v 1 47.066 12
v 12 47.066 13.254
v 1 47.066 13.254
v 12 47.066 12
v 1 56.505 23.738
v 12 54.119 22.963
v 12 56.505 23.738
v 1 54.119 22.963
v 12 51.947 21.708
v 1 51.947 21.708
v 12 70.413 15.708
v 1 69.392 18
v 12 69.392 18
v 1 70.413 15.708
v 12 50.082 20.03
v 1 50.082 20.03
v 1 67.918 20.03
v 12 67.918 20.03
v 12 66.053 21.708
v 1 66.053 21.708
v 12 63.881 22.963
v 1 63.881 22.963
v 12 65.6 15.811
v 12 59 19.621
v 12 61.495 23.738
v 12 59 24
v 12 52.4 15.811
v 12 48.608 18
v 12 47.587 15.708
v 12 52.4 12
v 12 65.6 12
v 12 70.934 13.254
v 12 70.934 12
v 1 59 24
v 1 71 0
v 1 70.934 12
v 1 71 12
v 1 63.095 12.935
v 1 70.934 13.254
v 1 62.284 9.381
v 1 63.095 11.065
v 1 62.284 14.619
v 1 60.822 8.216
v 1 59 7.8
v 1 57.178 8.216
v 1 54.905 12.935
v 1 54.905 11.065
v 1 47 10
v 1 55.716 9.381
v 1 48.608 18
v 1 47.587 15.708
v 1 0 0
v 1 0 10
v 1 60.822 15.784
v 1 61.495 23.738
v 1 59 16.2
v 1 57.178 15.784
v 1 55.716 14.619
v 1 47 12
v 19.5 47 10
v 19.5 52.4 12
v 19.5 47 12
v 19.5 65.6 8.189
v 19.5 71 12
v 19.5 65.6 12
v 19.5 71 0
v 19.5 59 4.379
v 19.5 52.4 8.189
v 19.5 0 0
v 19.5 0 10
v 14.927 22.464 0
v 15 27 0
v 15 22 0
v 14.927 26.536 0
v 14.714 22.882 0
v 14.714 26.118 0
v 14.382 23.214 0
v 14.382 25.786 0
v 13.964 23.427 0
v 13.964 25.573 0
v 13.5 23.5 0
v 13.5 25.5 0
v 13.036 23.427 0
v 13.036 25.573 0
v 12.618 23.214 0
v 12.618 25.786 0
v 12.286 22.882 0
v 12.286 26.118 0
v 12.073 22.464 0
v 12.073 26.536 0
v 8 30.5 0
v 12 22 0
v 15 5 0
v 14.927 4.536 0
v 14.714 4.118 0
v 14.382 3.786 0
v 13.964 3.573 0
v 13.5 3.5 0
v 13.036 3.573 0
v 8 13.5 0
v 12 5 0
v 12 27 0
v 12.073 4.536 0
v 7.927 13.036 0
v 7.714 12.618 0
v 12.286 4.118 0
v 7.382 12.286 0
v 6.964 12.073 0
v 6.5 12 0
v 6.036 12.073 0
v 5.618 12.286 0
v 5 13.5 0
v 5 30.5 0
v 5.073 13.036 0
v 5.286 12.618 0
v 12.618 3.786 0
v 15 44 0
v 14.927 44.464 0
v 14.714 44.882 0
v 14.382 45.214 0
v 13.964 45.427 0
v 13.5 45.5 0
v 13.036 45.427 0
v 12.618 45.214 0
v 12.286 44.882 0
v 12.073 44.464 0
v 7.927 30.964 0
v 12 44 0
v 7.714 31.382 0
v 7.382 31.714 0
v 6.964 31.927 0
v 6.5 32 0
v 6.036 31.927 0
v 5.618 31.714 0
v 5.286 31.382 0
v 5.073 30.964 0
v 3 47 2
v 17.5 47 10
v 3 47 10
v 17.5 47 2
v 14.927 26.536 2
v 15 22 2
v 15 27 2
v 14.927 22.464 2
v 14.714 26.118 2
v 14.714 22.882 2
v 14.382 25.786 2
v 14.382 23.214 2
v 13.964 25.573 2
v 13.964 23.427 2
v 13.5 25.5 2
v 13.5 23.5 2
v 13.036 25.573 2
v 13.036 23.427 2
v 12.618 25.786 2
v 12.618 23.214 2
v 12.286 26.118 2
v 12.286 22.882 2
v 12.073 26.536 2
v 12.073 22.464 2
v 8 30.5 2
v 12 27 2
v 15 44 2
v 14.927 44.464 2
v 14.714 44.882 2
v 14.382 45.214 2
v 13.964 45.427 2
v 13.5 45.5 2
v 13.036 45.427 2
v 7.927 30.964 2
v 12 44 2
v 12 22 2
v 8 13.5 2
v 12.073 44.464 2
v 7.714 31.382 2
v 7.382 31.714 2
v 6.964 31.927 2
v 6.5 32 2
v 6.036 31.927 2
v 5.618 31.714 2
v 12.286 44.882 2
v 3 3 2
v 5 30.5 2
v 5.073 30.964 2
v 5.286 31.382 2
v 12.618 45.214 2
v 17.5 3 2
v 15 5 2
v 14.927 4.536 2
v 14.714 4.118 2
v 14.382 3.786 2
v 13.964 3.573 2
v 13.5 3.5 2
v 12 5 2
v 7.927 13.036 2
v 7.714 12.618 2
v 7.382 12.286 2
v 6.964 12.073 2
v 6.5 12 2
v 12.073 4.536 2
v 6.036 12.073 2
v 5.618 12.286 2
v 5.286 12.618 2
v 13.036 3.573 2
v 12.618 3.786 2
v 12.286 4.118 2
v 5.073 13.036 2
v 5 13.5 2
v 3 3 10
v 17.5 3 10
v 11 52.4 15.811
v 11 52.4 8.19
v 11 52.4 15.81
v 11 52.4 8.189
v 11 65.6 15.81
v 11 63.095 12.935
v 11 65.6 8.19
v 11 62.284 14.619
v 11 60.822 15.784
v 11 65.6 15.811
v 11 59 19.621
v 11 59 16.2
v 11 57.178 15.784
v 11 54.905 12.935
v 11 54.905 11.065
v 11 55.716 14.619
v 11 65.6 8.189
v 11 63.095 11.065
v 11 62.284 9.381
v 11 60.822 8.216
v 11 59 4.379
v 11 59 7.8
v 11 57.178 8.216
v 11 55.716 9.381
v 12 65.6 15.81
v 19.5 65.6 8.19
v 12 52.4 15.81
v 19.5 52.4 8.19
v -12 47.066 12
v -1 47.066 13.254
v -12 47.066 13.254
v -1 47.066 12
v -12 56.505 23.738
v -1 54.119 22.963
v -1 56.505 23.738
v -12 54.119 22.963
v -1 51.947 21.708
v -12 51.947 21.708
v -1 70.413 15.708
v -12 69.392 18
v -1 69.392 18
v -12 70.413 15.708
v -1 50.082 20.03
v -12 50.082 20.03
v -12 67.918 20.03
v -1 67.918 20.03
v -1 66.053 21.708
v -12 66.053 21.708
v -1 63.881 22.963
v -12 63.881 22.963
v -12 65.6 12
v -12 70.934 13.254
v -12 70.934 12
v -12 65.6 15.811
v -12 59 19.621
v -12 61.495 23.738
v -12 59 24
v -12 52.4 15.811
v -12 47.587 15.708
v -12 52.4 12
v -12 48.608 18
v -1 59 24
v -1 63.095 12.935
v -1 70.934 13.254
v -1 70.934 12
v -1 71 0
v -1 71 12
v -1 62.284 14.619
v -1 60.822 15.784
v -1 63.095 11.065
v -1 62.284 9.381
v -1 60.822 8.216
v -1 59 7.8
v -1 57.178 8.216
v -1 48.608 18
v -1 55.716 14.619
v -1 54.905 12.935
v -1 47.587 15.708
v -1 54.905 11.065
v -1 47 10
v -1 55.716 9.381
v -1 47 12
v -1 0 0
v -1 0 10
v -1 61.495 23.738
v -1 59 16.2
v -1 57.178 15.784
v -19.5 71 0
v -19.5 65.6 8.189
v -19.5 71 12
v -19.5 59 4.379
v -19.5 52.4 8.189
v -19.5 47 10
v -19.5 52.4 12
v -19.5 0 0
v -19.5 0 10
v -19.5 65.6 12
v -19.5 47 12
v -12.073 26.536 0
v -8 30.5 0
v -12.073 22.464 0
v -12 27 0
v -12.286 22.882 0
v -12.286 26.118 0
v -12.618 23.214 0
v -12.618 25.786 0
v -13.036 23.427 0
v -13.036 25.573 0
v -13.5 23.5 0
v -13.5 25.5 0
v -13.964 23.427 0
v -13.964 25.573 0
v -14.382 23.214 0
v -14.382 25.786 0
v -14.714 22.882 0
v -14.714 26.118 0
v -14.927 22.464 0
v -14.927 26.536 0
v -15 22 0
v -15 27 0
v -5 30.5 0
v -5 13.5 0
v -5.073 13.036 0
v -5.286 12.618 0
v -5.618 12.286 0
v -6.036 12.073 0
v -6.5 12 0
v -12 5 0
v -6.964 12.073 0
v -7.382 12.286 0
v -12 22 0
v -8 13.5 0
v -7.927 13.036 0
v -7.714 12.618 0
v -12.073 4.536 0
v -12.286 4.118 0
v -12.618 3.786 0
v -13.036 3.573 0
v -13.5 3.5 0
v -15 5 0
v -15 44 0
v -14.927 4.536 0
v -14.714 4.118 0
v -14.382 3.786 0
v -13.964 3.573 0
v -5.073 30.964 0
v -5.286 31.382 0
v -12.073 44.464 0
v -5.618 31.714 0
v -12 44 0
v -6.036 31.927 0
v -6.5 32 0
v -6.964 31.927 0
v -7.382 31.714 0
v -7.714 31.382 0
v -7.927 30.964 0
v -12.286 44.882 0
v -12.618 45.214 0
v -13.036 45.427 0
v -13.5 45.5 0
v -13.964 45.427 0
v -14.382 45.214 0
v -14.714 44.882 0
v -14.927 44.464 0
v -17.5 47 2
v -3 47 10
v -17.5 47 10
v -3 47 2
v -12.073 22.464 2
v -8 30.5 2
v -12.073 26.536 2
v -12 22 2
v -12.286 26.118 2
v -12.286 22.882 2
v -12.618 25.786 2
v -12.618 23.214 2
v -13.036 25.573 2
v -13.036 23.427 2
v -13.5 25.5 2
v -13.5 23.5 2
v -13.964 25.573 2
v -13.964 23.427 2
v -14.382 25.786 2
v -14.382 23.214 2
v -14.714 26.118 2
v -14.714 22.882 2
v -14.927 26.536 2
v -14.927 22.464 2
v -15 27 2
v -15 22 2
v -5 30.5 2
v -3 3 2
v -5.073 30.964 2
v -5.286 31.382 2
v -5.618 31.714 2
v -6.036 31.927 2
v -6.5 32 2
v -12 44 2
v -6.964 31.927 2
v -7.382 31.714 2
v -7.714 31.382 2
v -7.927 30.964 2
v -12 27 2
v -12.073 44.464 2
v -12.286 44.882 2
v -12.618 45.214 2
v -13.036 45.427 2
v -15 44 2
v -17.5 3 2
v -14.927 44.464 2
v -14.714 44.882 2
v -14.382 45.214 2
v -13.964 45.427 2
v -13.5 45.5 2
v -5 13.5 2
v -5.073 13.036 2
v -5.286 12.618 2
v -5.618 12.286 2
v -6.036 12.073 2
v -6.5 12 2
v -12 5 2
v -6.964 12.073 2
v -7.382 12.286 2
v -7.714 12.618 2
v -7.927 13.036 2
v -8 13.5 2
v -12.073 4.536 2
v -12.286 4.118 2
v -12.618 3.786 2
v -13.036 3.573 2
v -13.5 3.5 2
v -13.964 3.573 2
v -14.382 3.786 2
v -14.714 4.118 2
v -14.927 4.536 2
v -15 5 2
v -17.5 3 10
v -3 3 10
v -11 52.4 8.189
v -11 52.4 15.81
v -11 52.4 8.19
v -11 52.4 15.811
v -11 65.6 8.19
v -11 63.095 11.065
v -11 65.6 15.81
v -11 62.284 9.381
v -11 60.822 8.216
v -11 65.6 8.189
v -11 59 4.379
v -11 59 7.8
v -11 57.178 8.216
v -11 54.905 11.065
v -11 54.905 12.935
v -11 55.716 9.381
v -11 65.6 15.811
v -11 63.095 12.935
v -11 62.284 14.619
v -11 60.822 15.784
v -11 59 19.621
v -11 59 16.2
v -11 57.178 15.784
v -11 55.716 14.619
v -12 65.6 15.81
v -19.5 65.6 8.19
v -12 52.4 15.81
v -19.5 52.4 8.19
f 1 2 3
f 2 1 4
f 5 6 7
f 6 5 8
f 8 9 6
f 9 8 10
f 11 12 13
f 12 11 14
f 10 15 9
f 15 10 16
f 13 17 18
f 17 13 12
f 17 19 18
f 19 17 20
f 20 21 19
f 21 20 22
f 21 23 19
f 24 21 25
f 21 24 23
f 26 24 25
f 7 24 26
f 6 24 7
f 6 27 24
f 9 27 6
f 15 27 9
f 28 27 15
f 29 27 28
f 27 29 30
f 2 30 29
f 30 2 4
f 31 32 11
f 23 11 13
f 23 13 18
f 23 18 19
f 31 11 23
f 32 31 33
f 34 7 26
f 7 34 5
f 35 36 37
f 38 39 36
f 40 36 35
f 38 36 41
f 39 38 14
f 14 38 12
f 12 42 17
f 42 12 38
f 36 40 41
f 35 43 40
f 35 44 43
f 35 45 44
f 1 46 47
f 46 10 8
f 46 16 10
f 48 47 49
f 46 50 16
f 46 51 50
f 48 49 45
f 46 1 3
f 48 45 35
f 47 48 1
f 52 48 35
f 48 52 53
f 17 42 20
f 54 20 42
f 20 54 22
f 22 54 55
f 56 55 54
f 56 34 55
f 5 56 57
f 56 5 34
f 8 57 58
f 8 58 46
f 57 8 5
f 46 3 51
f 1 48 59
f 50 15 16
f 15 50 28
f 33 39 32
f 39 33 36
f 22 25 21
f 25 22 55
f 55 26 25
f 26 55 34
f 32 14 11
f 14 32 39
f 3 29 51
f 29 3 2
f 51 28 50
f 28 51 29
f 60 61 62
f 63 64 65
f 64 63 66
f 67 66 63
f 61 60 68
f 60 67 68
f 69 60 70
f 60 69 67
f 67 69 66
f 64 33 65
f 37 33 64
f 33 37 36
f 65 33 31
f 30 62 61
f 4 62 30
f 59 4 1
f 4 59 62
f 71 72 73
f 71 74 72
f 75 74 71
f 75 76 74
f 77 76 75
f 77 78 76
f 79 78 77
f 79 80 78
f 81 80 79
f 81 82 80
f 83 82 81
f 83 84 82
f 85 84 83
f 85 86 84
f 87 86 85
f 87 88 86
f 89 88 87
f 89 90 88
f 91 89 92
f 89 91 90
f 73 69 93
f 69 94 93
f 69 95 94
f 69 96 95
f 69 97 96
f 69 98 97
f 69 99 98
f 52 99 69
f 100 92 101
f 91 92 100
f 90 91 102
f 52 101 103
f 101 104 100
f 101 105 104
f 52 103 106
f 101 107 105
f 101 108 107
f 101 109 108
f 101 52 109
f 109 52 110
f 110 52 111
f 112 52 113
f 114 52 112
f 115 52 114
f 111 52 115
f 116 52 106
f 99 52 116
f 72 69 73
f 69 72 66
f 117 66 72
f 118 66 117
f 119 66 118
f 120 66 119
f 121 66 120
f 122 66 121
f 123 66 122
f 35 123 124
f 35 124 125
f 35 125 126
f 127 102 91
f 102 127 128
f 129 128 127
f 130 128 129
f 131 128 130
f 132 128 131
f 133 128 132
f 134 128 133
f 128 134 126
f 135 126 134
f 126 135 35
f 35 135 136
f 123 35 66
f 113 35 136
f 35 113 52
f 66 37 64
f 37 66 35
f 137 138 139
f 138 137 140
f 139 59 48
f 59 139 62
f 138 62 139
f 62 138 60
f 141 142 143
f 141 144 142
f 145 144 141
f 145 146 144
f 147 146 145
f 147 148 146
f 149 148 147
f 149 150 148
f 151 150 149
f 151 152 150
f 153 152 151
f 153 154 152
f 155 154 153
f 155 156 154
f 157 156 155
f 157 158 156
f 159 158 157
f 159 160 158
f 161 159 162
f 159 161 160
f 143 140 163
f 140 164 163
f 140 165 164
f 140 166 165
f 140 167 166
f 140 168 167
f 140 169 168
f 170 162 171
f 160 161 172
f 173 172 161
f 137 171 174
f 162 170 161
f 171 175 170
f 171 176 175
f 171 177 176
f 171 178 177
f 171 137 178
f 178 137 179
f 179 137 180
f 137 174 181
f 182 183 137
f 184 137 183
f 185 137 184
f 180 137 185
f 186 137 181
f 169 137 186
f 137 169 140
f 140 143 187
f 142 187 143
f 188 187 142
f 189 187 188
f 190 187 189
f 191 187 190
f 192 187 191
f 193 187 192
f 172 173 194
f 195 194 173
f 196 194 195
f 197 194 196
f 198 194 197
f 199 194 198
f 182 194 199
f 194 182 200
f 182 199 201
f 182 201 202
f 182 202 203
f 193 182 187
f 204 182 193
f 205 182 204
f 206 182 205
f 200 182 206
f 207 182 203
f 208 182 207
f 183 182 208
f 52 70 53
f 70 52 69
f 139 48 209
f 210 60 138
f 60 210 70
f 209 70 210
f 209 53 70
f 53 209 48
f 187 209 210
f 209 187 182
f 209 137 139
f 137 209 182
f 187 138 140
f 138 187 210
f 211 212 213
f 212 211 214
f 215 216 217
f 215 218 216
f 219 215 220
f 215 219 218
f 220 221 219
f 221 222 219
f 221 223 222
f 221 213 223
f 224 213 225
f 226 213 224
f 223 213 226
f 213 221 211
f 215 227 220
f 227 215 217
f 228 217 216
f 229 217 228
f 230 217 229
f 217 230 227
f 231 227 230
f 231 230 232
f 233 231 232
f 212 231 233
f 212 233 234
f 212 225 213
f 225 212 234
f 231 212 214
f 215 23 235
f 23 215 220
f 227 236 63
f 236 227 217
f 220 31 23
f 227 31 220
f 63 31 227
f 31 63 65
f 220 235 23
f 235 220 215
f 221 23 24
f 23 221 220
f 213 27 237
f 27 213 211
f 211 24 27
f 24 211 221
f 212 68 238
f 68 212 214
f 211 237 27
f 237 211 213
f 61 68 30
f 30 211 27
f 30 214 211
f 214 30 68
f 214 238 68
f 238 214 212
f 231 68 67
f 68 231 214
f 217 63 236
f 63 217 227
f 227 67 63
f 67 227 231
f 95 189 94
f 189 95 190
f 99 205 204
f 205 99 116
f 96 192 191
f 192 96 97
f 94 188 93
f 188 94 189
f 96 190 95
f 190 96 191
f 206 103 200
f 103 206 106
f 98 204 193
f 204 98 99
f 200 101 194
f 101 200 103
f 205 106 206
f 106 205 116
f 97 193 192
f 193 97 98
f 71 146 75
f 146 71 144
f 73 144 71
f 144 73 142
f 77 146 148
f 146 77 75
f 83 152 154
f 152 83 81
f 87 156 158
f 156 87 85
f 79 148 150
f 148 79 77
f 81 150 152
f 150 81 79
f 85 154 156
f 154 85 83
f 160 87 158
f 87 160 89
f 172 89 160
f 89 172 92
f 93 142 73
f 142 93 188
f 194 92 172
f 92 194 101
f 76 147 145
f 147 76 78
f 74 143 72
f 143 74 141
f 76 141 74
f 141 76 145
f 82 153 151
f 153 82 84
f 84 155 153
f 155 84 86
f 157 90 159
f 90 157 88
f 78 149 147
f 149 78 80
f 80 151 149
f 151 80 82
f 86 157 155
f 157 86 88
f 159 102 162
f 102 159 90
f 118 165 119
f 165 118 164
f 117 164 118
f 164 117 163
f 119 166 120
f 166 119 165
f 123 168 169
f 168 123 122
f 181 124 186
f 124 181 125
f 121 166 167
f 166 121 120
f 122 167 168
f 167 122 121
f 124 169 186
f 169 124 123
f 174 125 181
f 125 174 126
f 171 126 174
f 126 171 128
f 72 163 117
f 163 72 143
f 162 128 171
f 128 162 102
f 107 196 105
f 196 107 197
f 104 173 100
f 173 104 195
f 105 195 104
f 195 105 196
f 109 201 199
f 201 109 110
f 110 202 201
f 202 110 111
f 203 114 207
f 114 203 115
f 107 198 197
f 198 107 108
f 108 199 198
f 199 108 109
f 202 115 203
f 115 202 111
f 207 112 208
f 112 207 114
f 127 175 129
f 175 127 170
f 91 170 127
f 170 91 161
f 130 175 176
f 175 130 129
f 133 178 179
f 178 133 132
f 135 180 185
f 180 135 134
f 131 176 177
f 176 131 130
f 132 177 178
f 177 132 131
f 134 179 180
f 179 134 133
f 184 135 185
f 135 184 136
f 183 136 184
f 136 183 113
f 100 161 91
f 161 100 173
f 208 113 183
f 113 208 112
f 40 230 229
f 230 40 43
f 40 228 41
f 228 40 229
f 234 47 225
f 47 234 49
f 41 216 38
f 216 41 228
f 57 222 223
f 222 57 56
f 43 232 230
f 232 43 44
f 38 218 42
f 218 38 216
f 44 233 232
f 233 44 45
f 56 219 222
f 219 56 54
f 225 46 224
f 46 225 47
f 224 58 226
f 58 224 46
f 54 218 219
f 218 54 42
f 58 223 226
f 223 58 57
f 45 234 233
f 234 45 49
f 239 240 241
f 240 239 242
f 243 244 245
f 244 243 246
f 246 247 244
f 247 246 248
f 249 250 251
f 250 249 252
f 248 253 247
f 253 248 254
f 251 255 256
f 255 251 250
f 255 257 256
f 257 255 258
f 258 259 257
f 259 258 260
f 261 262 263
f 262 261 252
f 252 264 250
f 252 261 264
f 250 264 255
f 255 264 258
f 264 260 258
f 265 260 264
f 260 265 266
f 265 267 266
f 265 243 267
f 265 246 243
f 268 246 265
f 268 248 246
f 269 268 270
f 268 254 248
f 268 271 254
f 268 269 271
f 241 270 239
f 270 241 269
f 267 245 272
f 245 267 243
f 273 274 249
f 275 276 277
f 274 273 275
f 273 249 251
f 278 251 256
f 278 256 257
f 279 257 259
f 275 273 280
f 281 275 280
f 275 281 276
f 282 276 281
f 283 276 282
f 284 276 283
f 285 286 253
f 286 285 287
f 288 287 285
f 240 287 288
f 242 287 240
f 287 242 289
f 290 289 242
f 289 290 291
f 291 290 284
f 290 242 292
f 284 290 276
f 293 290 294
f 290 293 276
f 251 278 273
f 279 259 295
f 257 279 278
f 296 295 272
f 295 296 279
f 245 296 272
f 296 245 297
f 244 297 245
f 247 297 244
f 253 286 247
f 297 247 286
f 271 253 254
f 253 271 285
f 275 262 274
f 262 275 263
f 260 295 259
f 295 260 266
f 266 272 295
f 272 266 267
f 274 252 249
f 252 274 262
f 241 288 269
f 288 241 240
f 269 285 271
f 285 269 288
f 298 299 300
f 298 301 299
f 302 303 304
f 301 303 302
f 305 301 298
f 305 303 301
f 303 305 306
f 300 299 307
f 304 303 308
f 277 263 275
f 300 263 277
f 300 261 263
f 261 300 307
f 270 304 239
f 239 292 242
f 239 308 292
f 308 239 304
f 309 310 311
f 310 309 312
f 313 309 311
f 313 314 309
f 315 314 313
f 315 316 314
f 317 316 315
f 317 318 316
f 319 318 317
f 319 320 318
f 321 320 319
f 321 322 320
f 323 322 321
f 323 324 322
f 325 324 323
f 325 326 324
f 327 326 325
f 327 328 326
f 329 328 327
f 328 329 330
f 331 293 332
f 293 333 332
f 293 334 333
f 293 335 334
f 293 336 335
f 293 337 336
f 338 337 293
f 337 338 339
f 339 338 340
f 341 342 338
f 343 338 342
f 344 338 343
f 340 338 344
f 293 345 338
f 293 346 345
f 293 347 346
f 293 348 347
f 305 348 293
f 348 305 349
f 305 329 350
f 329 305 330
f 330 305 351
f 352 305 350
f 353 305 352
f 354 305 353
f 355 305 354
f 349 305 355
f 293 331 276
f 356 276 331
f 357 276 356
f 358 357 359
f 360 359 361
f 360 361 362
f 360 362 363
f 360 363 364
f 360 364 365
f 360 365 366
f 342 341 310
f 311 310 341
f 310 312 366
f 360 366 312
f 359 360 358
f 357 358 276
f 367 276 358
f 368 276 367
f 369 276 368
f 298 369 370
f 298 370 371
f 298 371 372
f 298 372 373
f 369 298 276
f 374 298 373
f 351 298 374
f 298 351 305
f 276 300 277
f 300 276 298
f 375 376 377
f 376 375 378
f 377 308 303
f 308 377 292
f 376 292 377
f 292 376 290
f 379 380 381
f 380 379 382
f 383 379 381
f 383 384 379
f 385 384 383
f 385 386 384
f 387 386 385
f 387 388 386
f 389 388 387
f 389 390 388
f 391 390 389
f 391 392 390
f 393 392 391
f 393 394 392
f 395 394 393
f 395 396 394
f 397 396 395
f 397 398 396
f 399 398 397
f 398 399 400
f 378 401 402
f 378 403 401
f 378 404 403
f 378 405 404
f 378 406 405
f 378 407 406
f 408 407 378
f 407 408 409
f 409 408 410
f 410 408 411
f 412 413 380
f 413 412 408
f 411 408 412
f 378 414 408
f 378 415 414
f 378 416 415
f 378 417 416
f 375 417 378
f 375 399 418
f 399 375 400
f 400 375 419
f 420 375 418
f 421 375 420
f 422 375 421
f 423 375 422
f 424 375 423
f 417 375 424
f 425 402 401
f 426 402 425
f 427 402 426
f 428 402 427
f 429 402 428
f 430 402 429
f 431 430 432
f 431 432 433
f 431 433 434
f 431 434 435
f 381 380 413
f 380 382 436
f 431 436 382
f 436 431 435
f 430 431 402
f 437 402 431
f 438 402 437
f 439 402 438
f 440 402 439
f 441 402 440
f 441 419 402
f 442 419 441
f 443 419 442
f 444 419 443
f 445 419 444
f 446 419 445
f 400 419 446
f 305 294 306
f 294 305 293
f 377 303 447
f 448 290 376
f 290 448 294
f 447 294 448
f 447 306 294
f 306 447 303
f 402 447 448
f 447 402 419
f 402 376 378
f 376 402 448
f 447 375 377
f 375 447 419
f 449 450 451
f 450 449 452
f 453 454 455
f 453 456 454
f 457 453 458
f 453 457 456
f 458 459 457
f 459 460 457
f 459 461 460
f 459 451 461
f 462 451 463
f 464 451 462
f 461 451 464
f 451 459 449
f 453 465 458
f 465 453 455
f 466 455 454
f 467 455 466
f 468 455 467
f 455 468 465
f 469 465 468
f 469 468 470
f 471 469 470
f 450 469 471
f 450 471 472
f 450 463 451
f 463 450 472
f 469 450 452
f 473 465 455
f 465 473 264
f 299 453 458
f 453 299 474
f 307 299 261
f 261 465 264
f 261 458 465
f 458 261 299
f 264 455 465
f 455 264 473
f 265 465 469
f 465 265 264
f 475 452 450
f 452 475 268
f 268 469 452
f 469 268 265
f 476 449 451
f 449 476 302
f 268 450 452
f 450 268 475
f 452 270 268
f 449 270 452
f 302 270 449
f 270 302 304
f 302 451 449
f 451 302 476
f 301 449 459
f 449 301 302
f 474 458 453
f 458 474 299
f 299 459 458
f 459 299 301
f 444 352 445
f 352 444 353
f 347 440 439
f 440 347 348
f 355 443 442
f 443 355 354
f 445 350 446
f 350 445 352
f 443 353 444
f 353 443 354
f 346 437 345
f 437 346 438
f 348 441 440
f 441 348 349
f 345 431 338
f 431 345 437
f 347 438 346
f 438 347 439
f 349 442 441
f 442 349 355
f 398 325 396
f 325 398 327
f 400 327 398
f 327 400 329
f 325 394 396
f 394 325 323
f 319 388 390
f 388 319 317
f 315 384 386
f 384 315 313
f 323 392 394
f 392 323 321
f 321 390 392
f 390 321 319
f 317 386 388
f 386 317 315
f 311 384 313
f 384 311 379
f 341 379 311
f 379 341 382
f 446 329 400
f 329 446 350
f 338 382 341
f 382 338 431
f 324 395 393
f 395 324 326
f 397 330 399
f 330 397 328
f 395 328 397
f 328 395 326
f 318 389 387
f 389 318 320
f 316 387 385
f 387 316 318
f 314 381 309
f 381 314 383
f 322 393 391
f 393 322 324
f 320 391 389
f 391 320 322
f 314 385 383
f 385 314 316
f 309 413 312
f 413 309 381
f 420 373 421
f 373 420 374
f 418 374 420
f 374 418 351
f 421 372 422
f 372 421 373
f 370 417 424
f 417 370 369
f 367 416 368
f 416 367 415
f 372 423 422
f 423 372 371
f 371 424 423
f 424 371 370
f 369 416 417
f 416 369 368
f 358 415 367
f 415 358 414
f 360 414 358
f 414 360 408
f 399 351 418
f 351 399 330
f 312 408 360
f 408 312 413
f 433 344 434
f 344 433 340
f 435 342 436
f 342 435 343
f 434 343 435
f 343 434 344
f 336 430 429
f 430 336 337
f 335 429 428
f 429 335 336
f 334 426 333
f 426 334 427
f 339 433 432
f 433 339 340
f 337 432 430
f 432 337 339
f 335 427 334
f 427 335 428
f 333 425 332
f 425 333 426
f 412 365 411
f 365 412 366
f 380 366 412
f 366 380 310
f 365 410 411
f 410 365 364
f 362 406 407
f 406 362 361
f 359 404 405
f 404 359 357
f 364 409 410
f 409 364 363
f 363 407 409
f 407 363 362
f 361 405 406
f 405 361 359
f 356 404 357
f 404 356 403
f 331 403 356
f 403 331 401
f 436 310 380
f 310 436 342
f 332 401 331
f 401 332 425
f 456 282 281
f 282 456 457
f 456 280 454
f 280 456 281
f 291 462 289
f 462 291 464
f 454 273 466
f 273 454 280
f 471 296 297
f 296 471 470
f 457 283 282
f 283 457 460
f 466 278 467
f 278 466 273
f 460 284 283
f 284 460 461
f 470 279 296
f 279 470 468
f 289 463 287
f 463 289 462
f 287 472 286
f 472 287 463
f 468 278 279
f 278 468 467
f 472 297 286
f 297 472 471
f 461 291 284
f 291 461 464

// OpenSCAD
// file: Hexnut.scad
module hexnut(flats=10, depth=5){
	sliceangle = 360 / 6;
	pointradius = flats / (2 * cos(sliceangle/2));
	flatoffset = flats * tan(sliceangle/2) / 2;
	union(){
		for(angle=[0:sliceangle:360]) {
			rotate(angle,[0,0,1]) linear_extrude(height=depth) polygon(points=[[0,-1],[flatoffset,flats/2],[-flatoffset,flats/2]],paths=[[0,1,2]]);
		}
	}
}
// main file
use <Hexnut.scad>

module countersunk_trough(r1=2.15, r2=4, length=10, depth=3) {
	rotate(90,[1,0,0]) linear_extrude(height=length, center=true) polygon(points=[[-r1,-depth],[-r2,0],[r2,0],[r1,-depth]],paths=[[0,1,2,3]]);
	translate([0,-length/2,-depth])cylinder(r1=r1, r2=r2, h=depth);
	translate([0,length/2,-depth])cylinder(r1=r1, r2=r2, h=depth);
}

module trough(r=2.15, length=10, depth=8.5) {
	translate([0,-length/2,0])cylinder(r=r, h=depth);
	translate([0,length/2,0])cylinder(r=r, h=depth);
	translate([-r,-length/2,0]) cube([r*2,length,depth]);
}

module screw_trough(shaft=2.3, length=10, depth=12.5, cs_depth=2.5, cs_r1=2.3, cs_r2=4) {
	translate([0,0,depth+0.05]) countersunk_trough(r1=cs_r1, r2=cs_r2, length=length, depth=cs_depth);
	trough(r=shaft, length=length, depth=depth);
};

module trough(){
	translate([7,5,0]) cylinder(r=1.5,h=10,$fn=20);
	translate([7,22,0]) cylinder(r=1.5,h=10,$fn=20);
	translate([7-1.5,5,0]) cube([3,17,10]);
}

module body(height=5, width=11, length=35) {
	bracket_radius = 12;
	nut_depth = 7.5;
	nut_flats = 13.2;
	axle_radius = 4.2;
	difference() {
		union() {
			translate([0,bracket_radius+(length-15),bracket_radius]) rotate(90,[0,1,0]) cylinder(r=bracket_radius,h=width, center=true);
			translate([-width/2,length-15,0]) cube([width+nut_depth,bracket_radius*2,bracket_radius]);
			translate([-5.5,0,0]) cube([width+7.5,length,2]);
			translate([-5.5,0,0]) cube([width+7.5,3,10]);
			translate([-5.5,0,0]) cube([2,length,10]);
			translate([width,0,0]) cube([2,length,10]);
		}
		union() {
			translate([0,(length-15)+bracket_radius,bracket_radius]) rotate(90,[0,1,0]) cylinder(h=width+1, r=axle_radius, center=true);
			translate([(width/2)-1,(length-15)+bracket_radius,bracket_radius]) rotate(90,[0,1,0]) hexnut(flats=nut_flats, depth=nut_depth+2);
			trough();
			translate([0,22,0]) trough();
			translate([-7,8.5,0]) trough();
		}
	}
}

translate([6.5,0,0]) body(height=12, width=11, length=62);
mirror([1,0,0]) translate([6.5,0,0]) body(height=12, width=11, length=62);
